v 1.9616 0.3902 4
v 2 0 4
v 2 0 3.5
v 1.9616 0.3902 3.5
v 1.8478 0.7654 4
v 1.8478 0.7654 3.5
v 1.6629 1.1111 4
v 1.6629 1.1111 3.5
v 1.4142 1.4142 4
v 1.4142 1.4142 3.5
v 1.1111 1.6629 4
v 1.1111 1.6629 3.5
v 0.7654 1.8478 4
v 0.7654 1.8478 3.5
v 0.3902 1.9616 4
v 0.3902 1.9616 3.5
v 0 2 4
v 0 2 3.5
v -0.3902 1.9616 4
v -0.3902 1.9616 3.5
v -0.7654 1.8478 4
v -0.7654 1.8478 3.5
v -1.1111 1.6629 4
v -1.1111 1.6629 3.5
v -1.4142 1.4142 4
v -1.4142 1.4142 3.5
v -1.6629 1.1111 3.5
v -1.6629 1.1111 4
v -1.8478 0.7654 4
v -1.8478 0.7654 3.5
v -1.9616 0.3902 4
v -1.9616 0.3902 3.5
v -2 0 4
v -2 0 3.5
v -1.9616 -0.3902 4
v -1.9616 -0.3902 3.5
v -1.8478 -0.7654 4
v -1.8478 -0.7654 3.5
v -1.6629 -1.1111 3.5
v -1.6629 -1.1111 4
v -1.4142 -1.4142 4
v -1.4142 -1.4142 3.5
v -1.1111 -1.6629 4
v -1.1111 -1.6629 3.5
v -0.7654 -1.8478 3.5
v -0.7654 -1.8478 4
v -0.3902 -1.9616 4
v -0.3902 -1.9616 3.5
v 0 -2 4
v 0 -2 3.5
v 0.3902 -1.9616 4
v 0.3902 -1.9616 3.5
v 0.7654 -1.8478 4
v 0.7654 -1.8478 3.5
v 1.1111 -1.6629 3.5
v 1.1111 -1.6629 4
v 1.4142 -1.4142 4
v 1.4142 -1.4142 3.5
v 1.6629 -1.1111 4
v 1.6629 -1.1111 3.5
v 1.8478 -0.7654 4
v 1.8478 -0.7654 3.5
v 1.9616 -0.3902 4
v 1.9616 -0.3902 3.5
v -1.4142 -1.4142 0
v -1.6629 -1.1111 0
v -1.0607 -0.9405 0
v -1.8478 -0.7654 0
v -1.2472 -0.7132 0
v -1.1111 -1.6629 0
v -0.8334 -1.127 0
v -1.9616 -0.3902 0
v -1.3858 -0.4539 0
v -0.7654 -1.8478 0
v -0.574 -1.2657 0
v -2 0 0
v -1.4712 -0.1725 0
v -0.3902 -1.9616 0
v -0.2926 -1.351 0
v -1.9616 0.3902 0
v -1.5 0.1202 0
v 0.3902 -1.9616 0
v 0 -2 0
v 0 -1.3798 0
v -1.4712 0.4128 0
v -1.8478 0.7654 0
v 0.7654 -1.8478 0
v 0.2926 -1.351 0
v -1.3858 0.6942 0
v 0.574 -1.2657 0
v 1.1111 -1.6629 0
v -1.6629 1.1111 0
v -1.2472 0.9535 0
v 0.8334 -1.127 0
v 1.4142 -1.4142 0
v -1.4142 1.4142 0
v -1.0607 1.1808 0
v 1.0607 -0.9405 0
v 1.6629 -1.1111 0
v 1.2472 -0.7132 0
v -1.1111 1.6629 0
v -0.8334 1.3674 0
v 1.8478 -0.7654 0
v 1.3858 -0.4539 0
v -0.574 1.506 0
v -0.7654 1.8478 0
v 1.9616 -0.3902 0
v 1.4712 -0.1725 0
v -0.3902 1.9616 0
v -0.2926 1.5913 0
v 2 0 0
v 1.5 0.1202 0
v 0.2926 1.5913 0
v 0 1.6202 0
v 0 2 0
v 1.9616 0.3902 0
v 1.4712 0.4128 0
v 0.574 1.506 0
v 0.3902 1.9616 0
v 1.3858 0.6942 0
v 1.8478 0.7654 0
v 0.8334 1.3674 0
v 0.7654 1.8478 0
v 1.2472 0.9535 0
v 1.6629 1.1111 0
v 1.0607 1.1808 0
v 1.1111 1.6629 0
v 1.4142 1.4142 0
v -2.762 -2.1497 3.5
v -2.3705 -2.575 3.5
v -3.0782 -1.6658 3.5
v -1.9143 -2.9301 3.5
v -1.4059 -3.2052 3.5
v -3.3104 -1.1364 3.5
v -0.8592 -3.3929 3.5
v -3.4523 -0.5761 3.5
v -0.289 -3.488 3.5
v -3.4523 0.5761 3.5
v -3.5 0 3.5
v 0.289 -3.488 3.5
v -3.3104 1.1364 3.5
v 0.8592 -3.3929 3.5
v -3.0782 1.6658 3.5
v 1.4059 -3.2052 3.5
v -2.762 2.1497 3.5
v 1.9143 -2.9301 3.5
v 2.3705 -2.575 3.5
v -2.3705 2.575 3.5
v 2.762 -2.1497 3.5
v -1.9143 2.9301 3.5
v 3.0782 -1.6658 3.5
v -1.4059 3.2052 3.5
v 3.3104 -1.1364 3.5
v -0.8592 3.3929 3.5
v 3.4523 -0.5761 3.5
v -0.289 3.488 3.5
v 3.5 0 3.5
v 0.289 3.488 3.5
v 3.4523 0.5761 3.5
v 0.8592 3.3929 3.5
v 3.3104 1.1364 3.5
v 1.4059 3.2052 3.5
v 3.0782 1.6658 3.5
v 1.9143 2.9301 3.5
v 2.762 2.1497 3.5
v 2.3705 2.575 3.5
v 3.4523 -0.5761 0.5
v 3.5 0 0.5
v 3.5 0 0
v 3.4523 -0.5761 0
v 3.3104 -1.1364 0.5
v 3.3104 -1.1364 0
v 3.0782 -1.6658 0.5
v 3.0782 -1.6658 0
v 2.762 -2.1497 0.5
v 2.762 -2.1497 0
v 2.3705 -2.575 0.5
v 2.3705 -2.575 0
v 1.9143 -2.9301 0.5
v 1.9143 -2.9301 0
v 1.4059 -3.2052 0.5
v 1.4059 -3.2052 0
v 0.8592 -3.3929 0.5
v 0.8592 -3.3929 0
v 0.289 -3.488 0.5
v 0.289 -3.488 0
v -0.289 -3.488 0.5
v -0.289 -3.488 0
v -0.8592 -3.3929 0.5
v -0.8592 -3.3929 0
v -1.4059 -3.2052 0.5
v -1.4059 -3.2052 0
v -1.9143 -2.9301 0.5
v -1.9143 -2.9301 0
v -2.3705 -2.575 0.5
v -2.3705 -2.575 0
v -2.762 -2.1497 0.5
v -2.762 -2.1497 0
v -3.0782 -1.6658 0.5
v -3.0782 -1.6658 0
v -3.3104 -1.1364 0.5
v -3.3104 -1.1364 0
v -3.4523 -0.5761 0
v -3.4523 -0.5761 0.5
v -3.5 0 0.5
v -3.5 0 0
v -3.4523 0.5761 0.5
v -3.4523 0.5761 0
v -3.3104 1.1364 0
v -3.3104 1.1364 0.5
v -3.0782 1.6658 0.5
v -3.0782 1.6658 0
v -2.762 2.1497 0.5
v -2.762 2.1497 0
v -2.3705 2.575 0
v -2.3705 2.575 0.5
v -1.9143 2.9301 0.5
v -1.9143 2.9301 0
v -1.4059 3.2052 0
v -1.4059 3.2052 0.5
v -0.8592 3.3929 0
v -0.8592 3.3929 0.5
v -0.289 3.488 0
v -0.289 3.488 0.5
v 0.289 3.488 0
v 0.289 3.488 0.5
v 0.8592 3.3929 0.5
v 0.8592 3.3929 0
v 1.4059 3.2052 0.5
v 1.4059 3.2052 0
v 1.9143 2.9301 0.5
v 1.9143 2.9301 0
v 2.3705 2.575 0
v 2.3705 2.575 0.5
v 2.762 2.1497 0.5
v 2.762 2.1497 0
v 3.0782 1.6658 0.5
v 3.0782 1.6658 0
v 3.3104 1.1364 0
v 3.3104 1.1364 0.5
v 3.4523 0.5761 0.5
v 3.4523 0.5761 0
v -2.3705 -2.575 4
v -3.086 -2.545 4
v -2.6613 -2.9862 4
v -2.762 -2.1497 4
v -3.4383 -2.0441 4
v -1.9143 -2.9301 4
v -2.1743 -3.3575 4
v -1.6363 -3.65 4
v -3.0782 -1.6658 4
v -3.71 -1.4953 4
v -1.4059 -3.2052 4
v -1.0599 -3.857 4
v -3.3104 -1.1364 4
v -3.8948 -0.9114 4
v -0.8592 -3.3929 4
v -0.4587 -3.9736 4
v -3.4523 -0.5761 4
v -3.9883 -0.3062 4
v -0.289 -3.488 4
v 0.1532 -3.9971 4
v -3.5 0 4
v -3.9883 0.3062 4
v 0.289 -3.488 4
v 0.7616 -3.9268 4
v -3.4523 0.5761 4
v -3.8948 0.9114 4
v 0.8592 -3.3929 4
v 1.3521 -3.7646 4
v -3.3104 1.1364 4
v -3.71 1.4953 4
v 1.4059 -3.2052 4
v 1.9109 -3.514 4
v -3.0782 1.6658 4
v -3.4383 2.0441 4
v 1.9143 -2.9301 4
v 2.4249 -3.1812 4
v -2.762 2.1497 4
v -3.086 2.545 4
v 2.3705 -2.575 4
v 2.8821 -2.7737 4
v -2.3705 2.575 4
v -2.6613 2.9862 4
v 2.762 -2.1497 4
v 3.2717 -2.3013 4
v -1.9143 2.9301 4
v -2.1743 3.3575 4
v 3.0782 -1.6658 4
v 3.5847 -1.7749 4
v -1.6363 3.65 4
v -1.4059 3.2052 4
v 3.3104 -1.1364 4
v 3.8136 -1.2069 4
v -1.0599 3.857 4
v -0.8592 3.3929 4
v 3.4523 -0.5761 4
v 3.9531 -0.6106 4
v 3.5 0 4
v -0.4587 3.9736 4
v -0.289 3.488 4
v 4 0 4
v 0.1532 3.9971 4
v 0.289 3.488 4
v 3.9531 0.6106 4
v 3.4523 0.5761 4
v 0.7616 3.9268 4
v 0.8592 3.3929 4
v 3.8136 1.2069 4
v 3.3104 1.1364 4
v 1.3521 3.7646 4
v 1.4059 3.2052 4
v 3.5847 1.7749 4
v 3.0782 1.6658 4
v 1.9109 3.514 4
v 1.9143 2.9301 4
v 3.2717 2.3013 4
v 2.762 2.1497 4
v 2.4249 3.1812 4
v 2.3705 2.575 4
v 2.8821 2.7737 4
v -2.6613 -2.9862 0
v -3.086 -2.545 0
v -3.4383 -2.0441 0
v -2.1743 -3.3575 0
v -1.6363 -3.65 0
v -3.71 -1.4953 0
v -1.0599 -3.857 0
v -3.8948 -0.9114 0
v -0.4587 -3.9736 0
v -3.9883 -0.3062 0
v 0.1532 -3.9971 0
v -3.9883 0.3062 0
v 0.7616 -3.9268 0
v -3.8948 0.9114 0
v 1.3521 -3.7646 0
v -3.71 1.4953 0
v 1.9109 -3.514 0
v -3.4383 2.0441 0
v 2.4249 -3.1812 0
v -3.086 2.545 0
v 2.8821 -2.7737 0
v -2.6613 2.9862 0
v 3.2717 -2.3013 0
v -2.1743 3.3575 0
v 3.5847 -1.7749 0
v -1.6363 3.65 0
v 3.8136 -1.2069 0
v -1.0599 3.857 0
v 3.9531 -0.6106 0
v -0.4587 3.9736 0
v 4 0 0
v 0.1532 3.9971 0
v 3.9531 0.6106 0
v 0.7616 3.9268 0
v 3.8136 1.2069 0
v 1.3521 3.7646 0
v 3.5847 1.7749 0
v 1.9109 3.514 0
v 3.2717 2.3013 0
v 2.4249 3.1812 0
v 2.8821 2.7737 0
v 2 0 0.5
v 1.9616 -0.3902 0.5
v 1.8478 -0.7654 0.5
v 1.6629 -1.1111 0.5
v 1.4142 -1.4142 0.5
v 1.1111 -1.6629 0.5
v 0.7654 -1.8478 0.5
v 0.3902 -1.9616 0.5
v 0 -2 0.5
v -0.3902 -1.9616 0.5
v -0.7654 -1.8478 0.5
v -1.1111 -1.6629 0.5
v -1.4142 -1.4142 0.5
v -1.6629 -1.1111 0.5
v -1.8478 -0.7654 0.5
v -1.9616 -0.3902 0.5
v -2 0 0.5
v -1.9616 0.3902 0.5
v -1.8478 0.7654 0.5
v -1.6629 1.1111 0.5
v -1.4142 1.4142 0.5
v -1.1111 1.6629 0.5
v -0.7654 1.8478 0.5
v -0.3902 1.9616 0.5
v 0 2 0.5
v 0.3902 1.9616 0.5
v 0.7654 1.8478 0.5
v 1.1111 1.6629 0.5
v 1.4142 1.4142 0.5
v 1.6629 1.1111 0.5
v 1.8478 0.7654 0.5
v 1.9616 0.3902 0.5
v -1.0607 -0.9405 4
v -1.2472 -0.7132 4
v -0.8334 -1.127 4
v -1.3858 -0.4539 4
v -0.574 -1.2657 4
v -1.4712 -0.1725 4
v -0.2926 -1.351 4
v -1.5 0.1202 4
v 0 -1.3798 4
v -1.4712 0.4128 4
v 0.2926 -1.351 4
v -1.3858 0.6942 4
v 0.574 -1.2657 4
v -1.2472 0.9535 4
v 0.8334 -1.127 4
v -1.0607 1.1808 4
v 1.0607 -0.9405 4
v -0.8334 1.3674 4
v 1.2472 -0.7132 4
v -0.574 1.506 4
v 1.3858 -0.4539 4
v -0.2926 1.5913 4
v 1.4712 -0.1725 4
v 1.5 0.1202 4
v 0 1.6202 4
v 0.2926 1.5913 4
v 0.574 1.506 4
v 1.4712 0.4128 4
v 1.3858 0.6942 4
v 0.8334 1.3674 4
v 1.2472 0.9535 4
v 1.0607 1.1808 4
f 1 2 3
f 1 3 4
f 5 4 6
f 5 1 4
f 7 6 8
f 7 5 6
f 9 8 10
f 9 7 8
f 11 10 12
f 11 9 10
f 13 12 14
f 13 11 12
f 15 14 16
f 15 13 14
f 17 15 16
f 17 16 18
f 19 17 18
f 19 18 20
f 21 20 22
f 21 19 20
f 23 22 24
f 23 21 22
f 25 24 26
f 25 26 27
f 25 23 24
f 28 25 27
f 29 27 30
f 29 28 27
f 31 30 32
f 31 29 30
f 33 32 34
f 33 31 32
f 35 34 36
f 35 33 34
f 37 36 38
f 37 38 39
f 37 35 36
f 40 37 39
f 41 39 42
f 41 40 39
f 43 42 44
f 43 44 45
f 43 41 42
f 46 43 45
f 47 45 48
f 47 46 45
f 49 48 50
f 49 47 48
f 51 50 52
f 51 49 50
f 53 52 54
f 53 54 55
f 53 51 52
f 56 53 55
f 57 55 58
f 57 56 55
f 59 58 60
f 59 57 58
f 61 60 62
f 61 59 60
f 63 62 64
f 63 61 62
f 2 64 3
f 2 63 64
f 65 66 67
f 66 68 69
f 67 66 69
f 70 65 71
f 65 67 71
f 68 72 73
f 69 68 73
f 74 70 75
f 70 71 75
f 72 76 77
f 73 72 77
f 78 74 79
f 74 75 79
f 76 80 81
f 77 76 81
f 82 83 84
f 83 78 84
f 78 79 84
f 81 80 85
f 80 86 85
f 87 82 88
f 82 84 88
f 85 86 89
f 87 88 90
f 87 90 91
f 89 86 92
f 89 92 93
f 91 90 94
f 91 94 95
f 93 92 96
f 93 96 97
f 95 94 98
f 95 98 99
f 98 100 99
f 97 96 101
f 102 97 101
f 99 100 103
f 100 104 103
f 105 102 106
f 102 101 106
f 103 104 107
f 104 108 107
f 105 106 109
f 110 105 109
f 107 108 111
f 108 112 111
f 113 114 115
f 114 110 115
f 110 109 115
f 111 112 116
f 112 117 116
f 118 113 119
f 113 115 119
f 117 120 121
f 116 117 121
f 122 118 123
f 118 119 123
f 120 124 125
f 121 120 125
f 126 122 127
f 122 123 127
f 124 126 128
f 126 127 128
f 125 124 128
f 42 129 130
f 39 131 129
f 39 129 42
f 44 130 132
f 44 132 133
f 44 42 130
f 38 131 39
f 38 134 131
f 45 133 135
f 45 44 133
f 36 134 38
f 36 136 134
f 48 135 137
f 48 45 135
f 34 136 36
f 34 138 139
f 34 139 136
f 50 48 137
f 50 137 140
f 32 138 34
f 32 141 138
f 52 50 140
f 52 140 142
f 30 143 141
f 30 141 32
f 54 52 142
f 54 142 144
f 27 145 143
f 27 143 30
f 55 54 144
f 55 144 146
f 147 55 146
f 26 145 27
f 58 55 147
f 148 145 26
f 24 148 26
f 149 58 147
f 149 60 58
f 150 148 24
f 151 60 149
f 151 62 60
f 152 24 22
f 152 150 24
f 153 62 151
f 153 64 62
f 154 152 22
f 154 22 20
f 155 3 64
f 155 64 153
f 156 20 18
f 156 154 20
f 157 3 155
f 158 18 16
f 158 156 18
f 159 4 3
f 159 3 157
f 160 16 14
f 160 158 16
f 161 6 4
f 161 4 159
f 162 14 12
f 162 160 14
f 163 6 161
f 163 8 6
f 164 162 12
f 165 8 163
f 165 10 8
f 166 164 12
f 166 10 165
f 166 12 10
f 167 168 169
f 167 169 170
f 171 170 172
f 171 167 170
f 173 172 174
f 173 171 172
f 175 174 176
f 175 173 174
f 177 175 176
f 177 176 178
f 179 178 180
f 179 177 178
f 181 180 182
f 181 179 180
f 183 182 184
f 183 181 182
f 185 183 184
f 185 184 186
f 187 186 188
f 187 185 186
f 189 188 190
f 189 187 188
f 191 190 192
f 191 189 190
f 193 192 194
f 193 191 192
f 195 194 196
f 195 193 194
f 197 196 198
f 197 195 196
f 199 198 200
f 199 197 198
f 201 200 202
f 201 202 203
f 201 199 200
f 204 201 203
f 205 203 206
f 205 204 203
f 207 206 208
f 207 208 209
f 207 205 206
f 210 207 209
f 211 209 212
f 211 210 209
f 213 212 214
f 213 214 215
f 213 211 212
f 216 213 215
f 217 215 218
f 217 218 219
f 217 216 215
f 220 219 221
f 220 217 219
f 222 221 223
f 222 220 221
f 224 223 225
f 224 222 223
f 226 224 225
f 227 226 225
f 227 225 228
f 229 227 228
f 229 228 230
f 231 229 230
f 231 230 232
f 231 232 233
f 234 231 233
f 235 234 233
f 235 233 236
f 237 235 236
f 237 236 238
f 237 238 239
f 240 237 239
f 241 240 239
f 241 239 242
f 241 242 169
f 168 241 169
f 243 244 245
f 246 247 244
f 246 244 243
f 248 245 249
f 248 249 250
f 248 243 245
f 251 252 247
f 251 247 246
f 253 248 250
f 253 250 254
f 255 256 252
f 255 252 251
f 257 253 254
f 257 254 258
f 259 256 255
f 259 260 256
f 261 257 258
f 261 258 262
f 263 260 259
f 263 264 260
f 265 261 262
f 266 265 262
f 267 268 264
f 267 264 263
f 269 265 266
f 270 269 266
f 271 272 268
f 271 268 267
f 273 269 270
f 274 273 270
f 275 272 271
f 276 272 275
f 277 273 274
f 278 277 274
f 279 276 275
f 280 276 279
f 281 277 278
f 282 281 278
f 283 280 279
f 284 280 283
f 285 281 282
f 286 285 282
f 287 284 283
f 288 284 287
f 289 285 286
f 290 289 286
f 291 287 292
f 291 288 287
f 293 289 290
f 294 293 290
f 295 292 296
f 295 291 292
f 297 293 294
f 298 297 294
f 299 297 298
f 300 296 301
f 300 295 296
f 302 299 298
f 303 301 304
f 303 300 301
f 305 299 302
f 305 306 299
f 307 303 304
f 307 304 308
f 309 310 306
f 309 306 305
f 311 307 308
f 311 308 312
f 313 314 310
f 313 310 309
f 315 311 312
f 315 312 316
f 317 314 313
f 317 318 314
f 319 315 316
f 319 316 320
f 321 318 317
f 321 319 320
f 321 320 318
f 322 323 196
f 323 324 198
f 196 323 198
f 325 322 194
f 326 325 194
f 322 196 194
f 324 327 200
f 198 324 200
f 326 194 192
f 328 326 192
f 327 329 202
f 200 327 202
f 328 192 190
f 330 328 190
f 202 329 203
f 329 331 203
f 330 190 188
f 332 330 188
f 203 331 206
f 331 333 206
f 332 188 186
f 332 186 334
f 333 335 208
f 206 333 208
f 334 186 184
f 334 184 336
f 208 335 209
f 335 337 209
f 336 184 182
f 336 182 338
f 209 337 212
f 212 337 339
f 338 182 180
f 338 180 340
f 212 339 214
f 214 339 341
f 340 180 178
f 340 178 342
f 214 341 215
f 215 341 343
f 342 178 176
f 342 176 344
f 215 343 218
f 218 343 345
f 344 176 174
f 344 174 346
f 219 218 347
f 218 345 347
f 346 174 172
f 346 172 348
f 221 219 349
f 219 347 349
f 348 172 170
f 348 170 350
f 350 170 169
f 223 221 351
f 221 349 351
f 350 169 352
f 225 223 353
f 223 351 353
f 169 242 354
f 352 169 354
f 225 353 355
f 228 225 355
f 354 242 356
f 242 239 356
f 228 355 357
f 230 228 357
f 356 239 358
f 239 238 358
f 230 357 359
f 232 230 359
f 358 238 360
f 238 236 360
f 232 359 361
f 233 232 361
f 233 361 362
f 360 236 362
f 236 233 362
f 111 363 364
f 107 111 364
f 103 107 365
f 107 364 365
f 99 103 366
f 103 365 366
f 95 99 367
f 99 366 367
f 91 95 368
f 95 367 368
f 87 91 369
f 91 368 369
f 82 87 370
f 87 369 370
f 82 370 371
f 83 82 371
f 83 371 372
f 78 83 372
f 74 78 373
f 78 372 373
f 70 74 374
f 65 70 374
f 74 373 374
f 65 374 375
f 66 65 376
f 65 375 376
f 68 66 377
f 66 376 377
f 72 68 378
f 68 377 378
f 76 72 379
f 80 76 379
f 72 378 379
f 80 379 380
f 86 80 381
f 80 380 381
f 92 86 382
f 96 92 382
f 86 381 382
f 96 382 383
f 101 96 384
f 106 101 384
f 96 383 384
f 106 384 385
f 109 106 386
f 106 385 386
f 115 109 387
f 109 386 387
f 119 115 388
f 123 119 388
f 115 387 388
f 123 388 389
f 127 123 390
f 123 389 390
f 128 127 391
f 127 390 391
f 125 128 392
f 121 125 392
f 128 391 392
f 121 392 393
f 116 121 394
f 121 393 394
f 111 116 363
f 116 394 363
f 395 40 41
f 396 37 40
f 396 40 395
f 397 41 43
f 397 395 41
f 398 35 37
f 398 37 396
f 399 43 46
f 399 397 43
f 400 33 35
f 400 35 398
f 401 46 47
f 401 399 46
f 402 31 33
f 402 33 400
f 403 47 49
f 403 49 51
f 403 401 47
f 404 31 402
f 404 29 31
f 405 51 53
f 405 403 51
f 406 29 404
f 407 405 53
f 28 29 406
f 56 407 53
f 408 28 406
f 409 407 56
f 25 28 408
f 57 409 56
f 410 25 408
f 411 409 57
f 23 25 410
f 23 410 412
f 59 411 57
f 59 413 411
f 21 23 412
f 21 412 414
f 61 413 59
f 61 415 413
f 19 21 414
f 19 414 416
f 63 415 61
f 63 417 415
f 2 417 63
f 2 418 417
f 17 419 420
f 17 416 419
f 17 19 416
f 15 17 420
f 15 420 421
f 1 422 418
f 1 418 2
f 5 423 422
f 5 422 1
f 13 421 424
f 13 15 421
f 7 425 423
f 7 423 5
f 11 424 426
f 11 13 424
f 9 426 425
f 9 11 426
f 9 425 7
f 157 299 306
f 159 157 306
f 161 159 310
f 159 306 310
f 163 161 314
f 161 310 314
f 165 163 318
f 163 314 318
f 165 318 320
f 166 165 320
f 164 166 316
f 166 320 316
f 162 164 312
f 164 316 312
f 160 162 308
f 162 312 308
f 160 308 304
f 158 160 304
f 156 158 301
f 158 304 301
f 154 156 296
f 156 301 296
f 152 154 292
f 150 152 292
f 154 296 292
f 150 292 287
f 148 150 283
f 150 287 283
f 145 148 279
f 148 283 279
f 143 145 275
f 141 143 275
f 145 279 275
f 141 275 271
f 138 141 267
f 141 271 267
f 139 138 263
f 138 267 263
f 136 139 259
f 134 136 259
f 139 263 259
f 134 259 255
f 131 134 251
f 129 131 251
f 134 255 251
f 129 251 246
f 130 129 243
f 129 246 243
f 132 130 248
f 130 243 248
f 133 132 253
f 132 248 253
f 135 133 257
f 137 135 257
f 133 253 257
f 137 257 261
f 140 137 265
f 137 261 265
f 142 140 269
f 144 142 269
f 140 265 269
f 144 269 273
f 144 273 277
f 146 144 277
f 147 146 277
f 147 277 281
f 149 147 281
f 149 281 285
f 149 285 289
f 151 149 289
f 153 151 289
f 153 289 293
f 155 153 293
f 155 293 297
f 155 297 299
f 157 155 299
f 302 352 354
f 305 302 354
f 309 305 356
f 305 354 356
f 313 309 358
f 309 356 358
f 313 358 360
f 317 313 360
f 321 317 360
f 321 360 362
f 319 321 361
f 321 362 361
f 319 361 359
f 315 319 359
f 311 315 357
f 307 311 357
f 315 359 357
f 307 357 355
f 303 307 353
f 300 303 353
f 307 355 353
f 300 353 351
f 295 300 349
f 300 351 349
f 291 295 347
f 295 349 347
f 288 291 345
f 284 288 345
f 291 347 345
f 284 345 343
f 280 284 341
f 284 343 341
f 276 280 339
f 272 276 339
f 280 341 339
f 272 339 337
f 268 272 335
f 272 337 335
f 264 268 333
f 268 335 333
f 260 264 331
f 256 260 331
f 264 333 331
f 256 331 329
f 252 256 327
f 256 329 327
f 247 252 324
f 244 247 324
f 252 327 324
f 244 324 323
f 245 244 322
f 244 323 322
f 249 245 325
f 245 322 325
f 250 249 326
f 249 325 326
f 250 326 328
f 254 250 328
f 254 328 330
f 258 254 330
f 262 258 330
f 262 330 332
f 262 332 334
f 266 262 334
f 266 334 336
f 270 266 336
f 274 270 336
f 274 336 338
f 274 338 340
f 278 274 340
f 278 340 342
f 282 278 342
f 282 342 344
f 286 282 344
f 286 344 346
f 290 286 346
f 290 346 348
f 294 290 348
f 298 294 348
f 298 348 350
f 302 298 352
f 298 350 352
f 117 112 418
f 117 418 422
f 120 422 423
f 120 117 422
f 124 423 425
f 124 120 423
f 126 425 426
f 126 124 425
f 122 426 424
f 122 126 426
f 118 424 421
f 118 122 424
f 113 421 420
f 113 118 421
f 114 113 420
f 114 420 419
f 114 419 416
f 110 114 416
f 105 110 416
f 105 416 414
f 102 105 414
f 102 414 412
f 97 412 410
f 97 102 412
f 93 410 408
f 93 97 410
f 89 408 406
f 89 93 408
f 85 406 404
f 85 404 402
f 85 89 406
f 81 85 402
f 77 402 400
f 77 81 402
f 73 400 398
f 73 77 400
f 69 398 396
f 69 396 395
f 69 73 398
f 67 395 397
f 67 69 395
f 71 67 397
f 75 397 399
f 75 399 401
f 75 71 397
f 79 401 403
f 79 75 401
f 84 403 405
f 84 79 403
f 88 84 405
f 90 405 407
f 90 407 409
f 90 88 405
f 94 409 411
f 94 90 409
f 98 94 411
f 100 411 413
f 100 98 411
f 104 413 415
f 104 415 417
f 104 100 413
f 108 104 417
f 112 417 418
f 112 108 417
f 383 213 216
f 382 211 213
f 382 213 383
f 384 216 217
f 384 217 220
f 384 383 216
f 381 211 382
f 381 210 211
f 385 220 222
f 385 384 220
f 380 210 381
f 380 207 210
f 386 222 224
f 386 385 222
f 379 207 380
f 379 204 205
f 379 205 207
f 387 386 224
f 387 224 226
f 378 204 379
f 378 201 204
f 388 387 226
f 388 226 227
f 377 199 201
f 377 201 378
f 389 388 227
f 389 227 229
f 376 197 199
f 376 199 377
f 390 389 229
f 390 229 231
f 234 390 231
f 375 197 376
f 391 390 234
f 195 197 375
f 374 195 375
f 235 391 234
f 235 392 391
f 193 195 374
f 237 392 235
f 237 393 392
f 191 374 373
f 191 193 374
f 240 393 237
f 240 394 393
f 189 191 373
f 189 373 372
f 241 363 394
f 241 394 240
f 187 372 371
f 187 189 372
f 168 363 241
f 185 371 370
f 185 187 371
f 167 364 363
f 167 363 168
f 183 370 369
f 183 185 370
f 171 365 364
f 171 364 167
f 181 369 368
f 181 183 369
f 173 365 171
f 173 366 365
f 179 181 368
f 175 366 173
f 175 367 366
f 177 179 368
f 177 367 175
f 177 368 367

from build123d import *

# Parameters (mm, degrees)
SKETCH1_R           = 4
SKETCH1_R_2         = 1.5
BOSS_EXTRUDE2_DEPTH = 4
SKETCH3_R           = 3.5
SKETCH3_R_2         = 2
CUT_EXTRUDE1_DEPTH  = 0.5
CUT_EXTRUDE2_START  = -0.5
SKETCH4_R           = 3.5
SKETCH4_R_2         = 2
CUT_EXTRUDE2_DEPTH  = 0.5


with BuildPart() as part:
    # Sketch1 → Boss-Extrude2 (new body)
    with BuildSketch(Plane.XY):
        Circle(SKETCH1_R)
        with Locations((0, 0.120165435)):
            Circle(SKETCH1_R_2, mode=Mode.SUBTRACT)
    extrude(amount=BOSS_EXTRUDE2_DEPTH)

    # Sketch3 → Cut-Extrude1 (cut)
    with BuildSketch(Plane.XY.offset(4)):
        Circle(SKETCH3_R)
        Circle(SKETCH3_R_2, mode=Mode.SUBTRACT)
    extrude(amount=-CUT_EXTRUDE1_DEPTH, mode=Mode.SUBTRACT)

    # Sketch4 → Cut-Extrude2 (cut)
    with BuildSketch(Plane(origin=(0, 0, 0), x_dir=(-1, 0, 0), z_dir=(0, 0, -1)).offset(CUT_EXTRUDE2_START)):
        with Locations(Location((0, 0, 0), (0, 0, 180))):
            Circle(SKETCH4_R)
        with Locations(Location((0, 0, 0), (0, 0, 180))):
            Circle(SKETCH4_R_2, mode=Mode.SUBTRACT)
    extrude(amount=CUT_EXTRUDE2_DEPTH, mode=Mode.SUBTRACT)


solid = part.part
